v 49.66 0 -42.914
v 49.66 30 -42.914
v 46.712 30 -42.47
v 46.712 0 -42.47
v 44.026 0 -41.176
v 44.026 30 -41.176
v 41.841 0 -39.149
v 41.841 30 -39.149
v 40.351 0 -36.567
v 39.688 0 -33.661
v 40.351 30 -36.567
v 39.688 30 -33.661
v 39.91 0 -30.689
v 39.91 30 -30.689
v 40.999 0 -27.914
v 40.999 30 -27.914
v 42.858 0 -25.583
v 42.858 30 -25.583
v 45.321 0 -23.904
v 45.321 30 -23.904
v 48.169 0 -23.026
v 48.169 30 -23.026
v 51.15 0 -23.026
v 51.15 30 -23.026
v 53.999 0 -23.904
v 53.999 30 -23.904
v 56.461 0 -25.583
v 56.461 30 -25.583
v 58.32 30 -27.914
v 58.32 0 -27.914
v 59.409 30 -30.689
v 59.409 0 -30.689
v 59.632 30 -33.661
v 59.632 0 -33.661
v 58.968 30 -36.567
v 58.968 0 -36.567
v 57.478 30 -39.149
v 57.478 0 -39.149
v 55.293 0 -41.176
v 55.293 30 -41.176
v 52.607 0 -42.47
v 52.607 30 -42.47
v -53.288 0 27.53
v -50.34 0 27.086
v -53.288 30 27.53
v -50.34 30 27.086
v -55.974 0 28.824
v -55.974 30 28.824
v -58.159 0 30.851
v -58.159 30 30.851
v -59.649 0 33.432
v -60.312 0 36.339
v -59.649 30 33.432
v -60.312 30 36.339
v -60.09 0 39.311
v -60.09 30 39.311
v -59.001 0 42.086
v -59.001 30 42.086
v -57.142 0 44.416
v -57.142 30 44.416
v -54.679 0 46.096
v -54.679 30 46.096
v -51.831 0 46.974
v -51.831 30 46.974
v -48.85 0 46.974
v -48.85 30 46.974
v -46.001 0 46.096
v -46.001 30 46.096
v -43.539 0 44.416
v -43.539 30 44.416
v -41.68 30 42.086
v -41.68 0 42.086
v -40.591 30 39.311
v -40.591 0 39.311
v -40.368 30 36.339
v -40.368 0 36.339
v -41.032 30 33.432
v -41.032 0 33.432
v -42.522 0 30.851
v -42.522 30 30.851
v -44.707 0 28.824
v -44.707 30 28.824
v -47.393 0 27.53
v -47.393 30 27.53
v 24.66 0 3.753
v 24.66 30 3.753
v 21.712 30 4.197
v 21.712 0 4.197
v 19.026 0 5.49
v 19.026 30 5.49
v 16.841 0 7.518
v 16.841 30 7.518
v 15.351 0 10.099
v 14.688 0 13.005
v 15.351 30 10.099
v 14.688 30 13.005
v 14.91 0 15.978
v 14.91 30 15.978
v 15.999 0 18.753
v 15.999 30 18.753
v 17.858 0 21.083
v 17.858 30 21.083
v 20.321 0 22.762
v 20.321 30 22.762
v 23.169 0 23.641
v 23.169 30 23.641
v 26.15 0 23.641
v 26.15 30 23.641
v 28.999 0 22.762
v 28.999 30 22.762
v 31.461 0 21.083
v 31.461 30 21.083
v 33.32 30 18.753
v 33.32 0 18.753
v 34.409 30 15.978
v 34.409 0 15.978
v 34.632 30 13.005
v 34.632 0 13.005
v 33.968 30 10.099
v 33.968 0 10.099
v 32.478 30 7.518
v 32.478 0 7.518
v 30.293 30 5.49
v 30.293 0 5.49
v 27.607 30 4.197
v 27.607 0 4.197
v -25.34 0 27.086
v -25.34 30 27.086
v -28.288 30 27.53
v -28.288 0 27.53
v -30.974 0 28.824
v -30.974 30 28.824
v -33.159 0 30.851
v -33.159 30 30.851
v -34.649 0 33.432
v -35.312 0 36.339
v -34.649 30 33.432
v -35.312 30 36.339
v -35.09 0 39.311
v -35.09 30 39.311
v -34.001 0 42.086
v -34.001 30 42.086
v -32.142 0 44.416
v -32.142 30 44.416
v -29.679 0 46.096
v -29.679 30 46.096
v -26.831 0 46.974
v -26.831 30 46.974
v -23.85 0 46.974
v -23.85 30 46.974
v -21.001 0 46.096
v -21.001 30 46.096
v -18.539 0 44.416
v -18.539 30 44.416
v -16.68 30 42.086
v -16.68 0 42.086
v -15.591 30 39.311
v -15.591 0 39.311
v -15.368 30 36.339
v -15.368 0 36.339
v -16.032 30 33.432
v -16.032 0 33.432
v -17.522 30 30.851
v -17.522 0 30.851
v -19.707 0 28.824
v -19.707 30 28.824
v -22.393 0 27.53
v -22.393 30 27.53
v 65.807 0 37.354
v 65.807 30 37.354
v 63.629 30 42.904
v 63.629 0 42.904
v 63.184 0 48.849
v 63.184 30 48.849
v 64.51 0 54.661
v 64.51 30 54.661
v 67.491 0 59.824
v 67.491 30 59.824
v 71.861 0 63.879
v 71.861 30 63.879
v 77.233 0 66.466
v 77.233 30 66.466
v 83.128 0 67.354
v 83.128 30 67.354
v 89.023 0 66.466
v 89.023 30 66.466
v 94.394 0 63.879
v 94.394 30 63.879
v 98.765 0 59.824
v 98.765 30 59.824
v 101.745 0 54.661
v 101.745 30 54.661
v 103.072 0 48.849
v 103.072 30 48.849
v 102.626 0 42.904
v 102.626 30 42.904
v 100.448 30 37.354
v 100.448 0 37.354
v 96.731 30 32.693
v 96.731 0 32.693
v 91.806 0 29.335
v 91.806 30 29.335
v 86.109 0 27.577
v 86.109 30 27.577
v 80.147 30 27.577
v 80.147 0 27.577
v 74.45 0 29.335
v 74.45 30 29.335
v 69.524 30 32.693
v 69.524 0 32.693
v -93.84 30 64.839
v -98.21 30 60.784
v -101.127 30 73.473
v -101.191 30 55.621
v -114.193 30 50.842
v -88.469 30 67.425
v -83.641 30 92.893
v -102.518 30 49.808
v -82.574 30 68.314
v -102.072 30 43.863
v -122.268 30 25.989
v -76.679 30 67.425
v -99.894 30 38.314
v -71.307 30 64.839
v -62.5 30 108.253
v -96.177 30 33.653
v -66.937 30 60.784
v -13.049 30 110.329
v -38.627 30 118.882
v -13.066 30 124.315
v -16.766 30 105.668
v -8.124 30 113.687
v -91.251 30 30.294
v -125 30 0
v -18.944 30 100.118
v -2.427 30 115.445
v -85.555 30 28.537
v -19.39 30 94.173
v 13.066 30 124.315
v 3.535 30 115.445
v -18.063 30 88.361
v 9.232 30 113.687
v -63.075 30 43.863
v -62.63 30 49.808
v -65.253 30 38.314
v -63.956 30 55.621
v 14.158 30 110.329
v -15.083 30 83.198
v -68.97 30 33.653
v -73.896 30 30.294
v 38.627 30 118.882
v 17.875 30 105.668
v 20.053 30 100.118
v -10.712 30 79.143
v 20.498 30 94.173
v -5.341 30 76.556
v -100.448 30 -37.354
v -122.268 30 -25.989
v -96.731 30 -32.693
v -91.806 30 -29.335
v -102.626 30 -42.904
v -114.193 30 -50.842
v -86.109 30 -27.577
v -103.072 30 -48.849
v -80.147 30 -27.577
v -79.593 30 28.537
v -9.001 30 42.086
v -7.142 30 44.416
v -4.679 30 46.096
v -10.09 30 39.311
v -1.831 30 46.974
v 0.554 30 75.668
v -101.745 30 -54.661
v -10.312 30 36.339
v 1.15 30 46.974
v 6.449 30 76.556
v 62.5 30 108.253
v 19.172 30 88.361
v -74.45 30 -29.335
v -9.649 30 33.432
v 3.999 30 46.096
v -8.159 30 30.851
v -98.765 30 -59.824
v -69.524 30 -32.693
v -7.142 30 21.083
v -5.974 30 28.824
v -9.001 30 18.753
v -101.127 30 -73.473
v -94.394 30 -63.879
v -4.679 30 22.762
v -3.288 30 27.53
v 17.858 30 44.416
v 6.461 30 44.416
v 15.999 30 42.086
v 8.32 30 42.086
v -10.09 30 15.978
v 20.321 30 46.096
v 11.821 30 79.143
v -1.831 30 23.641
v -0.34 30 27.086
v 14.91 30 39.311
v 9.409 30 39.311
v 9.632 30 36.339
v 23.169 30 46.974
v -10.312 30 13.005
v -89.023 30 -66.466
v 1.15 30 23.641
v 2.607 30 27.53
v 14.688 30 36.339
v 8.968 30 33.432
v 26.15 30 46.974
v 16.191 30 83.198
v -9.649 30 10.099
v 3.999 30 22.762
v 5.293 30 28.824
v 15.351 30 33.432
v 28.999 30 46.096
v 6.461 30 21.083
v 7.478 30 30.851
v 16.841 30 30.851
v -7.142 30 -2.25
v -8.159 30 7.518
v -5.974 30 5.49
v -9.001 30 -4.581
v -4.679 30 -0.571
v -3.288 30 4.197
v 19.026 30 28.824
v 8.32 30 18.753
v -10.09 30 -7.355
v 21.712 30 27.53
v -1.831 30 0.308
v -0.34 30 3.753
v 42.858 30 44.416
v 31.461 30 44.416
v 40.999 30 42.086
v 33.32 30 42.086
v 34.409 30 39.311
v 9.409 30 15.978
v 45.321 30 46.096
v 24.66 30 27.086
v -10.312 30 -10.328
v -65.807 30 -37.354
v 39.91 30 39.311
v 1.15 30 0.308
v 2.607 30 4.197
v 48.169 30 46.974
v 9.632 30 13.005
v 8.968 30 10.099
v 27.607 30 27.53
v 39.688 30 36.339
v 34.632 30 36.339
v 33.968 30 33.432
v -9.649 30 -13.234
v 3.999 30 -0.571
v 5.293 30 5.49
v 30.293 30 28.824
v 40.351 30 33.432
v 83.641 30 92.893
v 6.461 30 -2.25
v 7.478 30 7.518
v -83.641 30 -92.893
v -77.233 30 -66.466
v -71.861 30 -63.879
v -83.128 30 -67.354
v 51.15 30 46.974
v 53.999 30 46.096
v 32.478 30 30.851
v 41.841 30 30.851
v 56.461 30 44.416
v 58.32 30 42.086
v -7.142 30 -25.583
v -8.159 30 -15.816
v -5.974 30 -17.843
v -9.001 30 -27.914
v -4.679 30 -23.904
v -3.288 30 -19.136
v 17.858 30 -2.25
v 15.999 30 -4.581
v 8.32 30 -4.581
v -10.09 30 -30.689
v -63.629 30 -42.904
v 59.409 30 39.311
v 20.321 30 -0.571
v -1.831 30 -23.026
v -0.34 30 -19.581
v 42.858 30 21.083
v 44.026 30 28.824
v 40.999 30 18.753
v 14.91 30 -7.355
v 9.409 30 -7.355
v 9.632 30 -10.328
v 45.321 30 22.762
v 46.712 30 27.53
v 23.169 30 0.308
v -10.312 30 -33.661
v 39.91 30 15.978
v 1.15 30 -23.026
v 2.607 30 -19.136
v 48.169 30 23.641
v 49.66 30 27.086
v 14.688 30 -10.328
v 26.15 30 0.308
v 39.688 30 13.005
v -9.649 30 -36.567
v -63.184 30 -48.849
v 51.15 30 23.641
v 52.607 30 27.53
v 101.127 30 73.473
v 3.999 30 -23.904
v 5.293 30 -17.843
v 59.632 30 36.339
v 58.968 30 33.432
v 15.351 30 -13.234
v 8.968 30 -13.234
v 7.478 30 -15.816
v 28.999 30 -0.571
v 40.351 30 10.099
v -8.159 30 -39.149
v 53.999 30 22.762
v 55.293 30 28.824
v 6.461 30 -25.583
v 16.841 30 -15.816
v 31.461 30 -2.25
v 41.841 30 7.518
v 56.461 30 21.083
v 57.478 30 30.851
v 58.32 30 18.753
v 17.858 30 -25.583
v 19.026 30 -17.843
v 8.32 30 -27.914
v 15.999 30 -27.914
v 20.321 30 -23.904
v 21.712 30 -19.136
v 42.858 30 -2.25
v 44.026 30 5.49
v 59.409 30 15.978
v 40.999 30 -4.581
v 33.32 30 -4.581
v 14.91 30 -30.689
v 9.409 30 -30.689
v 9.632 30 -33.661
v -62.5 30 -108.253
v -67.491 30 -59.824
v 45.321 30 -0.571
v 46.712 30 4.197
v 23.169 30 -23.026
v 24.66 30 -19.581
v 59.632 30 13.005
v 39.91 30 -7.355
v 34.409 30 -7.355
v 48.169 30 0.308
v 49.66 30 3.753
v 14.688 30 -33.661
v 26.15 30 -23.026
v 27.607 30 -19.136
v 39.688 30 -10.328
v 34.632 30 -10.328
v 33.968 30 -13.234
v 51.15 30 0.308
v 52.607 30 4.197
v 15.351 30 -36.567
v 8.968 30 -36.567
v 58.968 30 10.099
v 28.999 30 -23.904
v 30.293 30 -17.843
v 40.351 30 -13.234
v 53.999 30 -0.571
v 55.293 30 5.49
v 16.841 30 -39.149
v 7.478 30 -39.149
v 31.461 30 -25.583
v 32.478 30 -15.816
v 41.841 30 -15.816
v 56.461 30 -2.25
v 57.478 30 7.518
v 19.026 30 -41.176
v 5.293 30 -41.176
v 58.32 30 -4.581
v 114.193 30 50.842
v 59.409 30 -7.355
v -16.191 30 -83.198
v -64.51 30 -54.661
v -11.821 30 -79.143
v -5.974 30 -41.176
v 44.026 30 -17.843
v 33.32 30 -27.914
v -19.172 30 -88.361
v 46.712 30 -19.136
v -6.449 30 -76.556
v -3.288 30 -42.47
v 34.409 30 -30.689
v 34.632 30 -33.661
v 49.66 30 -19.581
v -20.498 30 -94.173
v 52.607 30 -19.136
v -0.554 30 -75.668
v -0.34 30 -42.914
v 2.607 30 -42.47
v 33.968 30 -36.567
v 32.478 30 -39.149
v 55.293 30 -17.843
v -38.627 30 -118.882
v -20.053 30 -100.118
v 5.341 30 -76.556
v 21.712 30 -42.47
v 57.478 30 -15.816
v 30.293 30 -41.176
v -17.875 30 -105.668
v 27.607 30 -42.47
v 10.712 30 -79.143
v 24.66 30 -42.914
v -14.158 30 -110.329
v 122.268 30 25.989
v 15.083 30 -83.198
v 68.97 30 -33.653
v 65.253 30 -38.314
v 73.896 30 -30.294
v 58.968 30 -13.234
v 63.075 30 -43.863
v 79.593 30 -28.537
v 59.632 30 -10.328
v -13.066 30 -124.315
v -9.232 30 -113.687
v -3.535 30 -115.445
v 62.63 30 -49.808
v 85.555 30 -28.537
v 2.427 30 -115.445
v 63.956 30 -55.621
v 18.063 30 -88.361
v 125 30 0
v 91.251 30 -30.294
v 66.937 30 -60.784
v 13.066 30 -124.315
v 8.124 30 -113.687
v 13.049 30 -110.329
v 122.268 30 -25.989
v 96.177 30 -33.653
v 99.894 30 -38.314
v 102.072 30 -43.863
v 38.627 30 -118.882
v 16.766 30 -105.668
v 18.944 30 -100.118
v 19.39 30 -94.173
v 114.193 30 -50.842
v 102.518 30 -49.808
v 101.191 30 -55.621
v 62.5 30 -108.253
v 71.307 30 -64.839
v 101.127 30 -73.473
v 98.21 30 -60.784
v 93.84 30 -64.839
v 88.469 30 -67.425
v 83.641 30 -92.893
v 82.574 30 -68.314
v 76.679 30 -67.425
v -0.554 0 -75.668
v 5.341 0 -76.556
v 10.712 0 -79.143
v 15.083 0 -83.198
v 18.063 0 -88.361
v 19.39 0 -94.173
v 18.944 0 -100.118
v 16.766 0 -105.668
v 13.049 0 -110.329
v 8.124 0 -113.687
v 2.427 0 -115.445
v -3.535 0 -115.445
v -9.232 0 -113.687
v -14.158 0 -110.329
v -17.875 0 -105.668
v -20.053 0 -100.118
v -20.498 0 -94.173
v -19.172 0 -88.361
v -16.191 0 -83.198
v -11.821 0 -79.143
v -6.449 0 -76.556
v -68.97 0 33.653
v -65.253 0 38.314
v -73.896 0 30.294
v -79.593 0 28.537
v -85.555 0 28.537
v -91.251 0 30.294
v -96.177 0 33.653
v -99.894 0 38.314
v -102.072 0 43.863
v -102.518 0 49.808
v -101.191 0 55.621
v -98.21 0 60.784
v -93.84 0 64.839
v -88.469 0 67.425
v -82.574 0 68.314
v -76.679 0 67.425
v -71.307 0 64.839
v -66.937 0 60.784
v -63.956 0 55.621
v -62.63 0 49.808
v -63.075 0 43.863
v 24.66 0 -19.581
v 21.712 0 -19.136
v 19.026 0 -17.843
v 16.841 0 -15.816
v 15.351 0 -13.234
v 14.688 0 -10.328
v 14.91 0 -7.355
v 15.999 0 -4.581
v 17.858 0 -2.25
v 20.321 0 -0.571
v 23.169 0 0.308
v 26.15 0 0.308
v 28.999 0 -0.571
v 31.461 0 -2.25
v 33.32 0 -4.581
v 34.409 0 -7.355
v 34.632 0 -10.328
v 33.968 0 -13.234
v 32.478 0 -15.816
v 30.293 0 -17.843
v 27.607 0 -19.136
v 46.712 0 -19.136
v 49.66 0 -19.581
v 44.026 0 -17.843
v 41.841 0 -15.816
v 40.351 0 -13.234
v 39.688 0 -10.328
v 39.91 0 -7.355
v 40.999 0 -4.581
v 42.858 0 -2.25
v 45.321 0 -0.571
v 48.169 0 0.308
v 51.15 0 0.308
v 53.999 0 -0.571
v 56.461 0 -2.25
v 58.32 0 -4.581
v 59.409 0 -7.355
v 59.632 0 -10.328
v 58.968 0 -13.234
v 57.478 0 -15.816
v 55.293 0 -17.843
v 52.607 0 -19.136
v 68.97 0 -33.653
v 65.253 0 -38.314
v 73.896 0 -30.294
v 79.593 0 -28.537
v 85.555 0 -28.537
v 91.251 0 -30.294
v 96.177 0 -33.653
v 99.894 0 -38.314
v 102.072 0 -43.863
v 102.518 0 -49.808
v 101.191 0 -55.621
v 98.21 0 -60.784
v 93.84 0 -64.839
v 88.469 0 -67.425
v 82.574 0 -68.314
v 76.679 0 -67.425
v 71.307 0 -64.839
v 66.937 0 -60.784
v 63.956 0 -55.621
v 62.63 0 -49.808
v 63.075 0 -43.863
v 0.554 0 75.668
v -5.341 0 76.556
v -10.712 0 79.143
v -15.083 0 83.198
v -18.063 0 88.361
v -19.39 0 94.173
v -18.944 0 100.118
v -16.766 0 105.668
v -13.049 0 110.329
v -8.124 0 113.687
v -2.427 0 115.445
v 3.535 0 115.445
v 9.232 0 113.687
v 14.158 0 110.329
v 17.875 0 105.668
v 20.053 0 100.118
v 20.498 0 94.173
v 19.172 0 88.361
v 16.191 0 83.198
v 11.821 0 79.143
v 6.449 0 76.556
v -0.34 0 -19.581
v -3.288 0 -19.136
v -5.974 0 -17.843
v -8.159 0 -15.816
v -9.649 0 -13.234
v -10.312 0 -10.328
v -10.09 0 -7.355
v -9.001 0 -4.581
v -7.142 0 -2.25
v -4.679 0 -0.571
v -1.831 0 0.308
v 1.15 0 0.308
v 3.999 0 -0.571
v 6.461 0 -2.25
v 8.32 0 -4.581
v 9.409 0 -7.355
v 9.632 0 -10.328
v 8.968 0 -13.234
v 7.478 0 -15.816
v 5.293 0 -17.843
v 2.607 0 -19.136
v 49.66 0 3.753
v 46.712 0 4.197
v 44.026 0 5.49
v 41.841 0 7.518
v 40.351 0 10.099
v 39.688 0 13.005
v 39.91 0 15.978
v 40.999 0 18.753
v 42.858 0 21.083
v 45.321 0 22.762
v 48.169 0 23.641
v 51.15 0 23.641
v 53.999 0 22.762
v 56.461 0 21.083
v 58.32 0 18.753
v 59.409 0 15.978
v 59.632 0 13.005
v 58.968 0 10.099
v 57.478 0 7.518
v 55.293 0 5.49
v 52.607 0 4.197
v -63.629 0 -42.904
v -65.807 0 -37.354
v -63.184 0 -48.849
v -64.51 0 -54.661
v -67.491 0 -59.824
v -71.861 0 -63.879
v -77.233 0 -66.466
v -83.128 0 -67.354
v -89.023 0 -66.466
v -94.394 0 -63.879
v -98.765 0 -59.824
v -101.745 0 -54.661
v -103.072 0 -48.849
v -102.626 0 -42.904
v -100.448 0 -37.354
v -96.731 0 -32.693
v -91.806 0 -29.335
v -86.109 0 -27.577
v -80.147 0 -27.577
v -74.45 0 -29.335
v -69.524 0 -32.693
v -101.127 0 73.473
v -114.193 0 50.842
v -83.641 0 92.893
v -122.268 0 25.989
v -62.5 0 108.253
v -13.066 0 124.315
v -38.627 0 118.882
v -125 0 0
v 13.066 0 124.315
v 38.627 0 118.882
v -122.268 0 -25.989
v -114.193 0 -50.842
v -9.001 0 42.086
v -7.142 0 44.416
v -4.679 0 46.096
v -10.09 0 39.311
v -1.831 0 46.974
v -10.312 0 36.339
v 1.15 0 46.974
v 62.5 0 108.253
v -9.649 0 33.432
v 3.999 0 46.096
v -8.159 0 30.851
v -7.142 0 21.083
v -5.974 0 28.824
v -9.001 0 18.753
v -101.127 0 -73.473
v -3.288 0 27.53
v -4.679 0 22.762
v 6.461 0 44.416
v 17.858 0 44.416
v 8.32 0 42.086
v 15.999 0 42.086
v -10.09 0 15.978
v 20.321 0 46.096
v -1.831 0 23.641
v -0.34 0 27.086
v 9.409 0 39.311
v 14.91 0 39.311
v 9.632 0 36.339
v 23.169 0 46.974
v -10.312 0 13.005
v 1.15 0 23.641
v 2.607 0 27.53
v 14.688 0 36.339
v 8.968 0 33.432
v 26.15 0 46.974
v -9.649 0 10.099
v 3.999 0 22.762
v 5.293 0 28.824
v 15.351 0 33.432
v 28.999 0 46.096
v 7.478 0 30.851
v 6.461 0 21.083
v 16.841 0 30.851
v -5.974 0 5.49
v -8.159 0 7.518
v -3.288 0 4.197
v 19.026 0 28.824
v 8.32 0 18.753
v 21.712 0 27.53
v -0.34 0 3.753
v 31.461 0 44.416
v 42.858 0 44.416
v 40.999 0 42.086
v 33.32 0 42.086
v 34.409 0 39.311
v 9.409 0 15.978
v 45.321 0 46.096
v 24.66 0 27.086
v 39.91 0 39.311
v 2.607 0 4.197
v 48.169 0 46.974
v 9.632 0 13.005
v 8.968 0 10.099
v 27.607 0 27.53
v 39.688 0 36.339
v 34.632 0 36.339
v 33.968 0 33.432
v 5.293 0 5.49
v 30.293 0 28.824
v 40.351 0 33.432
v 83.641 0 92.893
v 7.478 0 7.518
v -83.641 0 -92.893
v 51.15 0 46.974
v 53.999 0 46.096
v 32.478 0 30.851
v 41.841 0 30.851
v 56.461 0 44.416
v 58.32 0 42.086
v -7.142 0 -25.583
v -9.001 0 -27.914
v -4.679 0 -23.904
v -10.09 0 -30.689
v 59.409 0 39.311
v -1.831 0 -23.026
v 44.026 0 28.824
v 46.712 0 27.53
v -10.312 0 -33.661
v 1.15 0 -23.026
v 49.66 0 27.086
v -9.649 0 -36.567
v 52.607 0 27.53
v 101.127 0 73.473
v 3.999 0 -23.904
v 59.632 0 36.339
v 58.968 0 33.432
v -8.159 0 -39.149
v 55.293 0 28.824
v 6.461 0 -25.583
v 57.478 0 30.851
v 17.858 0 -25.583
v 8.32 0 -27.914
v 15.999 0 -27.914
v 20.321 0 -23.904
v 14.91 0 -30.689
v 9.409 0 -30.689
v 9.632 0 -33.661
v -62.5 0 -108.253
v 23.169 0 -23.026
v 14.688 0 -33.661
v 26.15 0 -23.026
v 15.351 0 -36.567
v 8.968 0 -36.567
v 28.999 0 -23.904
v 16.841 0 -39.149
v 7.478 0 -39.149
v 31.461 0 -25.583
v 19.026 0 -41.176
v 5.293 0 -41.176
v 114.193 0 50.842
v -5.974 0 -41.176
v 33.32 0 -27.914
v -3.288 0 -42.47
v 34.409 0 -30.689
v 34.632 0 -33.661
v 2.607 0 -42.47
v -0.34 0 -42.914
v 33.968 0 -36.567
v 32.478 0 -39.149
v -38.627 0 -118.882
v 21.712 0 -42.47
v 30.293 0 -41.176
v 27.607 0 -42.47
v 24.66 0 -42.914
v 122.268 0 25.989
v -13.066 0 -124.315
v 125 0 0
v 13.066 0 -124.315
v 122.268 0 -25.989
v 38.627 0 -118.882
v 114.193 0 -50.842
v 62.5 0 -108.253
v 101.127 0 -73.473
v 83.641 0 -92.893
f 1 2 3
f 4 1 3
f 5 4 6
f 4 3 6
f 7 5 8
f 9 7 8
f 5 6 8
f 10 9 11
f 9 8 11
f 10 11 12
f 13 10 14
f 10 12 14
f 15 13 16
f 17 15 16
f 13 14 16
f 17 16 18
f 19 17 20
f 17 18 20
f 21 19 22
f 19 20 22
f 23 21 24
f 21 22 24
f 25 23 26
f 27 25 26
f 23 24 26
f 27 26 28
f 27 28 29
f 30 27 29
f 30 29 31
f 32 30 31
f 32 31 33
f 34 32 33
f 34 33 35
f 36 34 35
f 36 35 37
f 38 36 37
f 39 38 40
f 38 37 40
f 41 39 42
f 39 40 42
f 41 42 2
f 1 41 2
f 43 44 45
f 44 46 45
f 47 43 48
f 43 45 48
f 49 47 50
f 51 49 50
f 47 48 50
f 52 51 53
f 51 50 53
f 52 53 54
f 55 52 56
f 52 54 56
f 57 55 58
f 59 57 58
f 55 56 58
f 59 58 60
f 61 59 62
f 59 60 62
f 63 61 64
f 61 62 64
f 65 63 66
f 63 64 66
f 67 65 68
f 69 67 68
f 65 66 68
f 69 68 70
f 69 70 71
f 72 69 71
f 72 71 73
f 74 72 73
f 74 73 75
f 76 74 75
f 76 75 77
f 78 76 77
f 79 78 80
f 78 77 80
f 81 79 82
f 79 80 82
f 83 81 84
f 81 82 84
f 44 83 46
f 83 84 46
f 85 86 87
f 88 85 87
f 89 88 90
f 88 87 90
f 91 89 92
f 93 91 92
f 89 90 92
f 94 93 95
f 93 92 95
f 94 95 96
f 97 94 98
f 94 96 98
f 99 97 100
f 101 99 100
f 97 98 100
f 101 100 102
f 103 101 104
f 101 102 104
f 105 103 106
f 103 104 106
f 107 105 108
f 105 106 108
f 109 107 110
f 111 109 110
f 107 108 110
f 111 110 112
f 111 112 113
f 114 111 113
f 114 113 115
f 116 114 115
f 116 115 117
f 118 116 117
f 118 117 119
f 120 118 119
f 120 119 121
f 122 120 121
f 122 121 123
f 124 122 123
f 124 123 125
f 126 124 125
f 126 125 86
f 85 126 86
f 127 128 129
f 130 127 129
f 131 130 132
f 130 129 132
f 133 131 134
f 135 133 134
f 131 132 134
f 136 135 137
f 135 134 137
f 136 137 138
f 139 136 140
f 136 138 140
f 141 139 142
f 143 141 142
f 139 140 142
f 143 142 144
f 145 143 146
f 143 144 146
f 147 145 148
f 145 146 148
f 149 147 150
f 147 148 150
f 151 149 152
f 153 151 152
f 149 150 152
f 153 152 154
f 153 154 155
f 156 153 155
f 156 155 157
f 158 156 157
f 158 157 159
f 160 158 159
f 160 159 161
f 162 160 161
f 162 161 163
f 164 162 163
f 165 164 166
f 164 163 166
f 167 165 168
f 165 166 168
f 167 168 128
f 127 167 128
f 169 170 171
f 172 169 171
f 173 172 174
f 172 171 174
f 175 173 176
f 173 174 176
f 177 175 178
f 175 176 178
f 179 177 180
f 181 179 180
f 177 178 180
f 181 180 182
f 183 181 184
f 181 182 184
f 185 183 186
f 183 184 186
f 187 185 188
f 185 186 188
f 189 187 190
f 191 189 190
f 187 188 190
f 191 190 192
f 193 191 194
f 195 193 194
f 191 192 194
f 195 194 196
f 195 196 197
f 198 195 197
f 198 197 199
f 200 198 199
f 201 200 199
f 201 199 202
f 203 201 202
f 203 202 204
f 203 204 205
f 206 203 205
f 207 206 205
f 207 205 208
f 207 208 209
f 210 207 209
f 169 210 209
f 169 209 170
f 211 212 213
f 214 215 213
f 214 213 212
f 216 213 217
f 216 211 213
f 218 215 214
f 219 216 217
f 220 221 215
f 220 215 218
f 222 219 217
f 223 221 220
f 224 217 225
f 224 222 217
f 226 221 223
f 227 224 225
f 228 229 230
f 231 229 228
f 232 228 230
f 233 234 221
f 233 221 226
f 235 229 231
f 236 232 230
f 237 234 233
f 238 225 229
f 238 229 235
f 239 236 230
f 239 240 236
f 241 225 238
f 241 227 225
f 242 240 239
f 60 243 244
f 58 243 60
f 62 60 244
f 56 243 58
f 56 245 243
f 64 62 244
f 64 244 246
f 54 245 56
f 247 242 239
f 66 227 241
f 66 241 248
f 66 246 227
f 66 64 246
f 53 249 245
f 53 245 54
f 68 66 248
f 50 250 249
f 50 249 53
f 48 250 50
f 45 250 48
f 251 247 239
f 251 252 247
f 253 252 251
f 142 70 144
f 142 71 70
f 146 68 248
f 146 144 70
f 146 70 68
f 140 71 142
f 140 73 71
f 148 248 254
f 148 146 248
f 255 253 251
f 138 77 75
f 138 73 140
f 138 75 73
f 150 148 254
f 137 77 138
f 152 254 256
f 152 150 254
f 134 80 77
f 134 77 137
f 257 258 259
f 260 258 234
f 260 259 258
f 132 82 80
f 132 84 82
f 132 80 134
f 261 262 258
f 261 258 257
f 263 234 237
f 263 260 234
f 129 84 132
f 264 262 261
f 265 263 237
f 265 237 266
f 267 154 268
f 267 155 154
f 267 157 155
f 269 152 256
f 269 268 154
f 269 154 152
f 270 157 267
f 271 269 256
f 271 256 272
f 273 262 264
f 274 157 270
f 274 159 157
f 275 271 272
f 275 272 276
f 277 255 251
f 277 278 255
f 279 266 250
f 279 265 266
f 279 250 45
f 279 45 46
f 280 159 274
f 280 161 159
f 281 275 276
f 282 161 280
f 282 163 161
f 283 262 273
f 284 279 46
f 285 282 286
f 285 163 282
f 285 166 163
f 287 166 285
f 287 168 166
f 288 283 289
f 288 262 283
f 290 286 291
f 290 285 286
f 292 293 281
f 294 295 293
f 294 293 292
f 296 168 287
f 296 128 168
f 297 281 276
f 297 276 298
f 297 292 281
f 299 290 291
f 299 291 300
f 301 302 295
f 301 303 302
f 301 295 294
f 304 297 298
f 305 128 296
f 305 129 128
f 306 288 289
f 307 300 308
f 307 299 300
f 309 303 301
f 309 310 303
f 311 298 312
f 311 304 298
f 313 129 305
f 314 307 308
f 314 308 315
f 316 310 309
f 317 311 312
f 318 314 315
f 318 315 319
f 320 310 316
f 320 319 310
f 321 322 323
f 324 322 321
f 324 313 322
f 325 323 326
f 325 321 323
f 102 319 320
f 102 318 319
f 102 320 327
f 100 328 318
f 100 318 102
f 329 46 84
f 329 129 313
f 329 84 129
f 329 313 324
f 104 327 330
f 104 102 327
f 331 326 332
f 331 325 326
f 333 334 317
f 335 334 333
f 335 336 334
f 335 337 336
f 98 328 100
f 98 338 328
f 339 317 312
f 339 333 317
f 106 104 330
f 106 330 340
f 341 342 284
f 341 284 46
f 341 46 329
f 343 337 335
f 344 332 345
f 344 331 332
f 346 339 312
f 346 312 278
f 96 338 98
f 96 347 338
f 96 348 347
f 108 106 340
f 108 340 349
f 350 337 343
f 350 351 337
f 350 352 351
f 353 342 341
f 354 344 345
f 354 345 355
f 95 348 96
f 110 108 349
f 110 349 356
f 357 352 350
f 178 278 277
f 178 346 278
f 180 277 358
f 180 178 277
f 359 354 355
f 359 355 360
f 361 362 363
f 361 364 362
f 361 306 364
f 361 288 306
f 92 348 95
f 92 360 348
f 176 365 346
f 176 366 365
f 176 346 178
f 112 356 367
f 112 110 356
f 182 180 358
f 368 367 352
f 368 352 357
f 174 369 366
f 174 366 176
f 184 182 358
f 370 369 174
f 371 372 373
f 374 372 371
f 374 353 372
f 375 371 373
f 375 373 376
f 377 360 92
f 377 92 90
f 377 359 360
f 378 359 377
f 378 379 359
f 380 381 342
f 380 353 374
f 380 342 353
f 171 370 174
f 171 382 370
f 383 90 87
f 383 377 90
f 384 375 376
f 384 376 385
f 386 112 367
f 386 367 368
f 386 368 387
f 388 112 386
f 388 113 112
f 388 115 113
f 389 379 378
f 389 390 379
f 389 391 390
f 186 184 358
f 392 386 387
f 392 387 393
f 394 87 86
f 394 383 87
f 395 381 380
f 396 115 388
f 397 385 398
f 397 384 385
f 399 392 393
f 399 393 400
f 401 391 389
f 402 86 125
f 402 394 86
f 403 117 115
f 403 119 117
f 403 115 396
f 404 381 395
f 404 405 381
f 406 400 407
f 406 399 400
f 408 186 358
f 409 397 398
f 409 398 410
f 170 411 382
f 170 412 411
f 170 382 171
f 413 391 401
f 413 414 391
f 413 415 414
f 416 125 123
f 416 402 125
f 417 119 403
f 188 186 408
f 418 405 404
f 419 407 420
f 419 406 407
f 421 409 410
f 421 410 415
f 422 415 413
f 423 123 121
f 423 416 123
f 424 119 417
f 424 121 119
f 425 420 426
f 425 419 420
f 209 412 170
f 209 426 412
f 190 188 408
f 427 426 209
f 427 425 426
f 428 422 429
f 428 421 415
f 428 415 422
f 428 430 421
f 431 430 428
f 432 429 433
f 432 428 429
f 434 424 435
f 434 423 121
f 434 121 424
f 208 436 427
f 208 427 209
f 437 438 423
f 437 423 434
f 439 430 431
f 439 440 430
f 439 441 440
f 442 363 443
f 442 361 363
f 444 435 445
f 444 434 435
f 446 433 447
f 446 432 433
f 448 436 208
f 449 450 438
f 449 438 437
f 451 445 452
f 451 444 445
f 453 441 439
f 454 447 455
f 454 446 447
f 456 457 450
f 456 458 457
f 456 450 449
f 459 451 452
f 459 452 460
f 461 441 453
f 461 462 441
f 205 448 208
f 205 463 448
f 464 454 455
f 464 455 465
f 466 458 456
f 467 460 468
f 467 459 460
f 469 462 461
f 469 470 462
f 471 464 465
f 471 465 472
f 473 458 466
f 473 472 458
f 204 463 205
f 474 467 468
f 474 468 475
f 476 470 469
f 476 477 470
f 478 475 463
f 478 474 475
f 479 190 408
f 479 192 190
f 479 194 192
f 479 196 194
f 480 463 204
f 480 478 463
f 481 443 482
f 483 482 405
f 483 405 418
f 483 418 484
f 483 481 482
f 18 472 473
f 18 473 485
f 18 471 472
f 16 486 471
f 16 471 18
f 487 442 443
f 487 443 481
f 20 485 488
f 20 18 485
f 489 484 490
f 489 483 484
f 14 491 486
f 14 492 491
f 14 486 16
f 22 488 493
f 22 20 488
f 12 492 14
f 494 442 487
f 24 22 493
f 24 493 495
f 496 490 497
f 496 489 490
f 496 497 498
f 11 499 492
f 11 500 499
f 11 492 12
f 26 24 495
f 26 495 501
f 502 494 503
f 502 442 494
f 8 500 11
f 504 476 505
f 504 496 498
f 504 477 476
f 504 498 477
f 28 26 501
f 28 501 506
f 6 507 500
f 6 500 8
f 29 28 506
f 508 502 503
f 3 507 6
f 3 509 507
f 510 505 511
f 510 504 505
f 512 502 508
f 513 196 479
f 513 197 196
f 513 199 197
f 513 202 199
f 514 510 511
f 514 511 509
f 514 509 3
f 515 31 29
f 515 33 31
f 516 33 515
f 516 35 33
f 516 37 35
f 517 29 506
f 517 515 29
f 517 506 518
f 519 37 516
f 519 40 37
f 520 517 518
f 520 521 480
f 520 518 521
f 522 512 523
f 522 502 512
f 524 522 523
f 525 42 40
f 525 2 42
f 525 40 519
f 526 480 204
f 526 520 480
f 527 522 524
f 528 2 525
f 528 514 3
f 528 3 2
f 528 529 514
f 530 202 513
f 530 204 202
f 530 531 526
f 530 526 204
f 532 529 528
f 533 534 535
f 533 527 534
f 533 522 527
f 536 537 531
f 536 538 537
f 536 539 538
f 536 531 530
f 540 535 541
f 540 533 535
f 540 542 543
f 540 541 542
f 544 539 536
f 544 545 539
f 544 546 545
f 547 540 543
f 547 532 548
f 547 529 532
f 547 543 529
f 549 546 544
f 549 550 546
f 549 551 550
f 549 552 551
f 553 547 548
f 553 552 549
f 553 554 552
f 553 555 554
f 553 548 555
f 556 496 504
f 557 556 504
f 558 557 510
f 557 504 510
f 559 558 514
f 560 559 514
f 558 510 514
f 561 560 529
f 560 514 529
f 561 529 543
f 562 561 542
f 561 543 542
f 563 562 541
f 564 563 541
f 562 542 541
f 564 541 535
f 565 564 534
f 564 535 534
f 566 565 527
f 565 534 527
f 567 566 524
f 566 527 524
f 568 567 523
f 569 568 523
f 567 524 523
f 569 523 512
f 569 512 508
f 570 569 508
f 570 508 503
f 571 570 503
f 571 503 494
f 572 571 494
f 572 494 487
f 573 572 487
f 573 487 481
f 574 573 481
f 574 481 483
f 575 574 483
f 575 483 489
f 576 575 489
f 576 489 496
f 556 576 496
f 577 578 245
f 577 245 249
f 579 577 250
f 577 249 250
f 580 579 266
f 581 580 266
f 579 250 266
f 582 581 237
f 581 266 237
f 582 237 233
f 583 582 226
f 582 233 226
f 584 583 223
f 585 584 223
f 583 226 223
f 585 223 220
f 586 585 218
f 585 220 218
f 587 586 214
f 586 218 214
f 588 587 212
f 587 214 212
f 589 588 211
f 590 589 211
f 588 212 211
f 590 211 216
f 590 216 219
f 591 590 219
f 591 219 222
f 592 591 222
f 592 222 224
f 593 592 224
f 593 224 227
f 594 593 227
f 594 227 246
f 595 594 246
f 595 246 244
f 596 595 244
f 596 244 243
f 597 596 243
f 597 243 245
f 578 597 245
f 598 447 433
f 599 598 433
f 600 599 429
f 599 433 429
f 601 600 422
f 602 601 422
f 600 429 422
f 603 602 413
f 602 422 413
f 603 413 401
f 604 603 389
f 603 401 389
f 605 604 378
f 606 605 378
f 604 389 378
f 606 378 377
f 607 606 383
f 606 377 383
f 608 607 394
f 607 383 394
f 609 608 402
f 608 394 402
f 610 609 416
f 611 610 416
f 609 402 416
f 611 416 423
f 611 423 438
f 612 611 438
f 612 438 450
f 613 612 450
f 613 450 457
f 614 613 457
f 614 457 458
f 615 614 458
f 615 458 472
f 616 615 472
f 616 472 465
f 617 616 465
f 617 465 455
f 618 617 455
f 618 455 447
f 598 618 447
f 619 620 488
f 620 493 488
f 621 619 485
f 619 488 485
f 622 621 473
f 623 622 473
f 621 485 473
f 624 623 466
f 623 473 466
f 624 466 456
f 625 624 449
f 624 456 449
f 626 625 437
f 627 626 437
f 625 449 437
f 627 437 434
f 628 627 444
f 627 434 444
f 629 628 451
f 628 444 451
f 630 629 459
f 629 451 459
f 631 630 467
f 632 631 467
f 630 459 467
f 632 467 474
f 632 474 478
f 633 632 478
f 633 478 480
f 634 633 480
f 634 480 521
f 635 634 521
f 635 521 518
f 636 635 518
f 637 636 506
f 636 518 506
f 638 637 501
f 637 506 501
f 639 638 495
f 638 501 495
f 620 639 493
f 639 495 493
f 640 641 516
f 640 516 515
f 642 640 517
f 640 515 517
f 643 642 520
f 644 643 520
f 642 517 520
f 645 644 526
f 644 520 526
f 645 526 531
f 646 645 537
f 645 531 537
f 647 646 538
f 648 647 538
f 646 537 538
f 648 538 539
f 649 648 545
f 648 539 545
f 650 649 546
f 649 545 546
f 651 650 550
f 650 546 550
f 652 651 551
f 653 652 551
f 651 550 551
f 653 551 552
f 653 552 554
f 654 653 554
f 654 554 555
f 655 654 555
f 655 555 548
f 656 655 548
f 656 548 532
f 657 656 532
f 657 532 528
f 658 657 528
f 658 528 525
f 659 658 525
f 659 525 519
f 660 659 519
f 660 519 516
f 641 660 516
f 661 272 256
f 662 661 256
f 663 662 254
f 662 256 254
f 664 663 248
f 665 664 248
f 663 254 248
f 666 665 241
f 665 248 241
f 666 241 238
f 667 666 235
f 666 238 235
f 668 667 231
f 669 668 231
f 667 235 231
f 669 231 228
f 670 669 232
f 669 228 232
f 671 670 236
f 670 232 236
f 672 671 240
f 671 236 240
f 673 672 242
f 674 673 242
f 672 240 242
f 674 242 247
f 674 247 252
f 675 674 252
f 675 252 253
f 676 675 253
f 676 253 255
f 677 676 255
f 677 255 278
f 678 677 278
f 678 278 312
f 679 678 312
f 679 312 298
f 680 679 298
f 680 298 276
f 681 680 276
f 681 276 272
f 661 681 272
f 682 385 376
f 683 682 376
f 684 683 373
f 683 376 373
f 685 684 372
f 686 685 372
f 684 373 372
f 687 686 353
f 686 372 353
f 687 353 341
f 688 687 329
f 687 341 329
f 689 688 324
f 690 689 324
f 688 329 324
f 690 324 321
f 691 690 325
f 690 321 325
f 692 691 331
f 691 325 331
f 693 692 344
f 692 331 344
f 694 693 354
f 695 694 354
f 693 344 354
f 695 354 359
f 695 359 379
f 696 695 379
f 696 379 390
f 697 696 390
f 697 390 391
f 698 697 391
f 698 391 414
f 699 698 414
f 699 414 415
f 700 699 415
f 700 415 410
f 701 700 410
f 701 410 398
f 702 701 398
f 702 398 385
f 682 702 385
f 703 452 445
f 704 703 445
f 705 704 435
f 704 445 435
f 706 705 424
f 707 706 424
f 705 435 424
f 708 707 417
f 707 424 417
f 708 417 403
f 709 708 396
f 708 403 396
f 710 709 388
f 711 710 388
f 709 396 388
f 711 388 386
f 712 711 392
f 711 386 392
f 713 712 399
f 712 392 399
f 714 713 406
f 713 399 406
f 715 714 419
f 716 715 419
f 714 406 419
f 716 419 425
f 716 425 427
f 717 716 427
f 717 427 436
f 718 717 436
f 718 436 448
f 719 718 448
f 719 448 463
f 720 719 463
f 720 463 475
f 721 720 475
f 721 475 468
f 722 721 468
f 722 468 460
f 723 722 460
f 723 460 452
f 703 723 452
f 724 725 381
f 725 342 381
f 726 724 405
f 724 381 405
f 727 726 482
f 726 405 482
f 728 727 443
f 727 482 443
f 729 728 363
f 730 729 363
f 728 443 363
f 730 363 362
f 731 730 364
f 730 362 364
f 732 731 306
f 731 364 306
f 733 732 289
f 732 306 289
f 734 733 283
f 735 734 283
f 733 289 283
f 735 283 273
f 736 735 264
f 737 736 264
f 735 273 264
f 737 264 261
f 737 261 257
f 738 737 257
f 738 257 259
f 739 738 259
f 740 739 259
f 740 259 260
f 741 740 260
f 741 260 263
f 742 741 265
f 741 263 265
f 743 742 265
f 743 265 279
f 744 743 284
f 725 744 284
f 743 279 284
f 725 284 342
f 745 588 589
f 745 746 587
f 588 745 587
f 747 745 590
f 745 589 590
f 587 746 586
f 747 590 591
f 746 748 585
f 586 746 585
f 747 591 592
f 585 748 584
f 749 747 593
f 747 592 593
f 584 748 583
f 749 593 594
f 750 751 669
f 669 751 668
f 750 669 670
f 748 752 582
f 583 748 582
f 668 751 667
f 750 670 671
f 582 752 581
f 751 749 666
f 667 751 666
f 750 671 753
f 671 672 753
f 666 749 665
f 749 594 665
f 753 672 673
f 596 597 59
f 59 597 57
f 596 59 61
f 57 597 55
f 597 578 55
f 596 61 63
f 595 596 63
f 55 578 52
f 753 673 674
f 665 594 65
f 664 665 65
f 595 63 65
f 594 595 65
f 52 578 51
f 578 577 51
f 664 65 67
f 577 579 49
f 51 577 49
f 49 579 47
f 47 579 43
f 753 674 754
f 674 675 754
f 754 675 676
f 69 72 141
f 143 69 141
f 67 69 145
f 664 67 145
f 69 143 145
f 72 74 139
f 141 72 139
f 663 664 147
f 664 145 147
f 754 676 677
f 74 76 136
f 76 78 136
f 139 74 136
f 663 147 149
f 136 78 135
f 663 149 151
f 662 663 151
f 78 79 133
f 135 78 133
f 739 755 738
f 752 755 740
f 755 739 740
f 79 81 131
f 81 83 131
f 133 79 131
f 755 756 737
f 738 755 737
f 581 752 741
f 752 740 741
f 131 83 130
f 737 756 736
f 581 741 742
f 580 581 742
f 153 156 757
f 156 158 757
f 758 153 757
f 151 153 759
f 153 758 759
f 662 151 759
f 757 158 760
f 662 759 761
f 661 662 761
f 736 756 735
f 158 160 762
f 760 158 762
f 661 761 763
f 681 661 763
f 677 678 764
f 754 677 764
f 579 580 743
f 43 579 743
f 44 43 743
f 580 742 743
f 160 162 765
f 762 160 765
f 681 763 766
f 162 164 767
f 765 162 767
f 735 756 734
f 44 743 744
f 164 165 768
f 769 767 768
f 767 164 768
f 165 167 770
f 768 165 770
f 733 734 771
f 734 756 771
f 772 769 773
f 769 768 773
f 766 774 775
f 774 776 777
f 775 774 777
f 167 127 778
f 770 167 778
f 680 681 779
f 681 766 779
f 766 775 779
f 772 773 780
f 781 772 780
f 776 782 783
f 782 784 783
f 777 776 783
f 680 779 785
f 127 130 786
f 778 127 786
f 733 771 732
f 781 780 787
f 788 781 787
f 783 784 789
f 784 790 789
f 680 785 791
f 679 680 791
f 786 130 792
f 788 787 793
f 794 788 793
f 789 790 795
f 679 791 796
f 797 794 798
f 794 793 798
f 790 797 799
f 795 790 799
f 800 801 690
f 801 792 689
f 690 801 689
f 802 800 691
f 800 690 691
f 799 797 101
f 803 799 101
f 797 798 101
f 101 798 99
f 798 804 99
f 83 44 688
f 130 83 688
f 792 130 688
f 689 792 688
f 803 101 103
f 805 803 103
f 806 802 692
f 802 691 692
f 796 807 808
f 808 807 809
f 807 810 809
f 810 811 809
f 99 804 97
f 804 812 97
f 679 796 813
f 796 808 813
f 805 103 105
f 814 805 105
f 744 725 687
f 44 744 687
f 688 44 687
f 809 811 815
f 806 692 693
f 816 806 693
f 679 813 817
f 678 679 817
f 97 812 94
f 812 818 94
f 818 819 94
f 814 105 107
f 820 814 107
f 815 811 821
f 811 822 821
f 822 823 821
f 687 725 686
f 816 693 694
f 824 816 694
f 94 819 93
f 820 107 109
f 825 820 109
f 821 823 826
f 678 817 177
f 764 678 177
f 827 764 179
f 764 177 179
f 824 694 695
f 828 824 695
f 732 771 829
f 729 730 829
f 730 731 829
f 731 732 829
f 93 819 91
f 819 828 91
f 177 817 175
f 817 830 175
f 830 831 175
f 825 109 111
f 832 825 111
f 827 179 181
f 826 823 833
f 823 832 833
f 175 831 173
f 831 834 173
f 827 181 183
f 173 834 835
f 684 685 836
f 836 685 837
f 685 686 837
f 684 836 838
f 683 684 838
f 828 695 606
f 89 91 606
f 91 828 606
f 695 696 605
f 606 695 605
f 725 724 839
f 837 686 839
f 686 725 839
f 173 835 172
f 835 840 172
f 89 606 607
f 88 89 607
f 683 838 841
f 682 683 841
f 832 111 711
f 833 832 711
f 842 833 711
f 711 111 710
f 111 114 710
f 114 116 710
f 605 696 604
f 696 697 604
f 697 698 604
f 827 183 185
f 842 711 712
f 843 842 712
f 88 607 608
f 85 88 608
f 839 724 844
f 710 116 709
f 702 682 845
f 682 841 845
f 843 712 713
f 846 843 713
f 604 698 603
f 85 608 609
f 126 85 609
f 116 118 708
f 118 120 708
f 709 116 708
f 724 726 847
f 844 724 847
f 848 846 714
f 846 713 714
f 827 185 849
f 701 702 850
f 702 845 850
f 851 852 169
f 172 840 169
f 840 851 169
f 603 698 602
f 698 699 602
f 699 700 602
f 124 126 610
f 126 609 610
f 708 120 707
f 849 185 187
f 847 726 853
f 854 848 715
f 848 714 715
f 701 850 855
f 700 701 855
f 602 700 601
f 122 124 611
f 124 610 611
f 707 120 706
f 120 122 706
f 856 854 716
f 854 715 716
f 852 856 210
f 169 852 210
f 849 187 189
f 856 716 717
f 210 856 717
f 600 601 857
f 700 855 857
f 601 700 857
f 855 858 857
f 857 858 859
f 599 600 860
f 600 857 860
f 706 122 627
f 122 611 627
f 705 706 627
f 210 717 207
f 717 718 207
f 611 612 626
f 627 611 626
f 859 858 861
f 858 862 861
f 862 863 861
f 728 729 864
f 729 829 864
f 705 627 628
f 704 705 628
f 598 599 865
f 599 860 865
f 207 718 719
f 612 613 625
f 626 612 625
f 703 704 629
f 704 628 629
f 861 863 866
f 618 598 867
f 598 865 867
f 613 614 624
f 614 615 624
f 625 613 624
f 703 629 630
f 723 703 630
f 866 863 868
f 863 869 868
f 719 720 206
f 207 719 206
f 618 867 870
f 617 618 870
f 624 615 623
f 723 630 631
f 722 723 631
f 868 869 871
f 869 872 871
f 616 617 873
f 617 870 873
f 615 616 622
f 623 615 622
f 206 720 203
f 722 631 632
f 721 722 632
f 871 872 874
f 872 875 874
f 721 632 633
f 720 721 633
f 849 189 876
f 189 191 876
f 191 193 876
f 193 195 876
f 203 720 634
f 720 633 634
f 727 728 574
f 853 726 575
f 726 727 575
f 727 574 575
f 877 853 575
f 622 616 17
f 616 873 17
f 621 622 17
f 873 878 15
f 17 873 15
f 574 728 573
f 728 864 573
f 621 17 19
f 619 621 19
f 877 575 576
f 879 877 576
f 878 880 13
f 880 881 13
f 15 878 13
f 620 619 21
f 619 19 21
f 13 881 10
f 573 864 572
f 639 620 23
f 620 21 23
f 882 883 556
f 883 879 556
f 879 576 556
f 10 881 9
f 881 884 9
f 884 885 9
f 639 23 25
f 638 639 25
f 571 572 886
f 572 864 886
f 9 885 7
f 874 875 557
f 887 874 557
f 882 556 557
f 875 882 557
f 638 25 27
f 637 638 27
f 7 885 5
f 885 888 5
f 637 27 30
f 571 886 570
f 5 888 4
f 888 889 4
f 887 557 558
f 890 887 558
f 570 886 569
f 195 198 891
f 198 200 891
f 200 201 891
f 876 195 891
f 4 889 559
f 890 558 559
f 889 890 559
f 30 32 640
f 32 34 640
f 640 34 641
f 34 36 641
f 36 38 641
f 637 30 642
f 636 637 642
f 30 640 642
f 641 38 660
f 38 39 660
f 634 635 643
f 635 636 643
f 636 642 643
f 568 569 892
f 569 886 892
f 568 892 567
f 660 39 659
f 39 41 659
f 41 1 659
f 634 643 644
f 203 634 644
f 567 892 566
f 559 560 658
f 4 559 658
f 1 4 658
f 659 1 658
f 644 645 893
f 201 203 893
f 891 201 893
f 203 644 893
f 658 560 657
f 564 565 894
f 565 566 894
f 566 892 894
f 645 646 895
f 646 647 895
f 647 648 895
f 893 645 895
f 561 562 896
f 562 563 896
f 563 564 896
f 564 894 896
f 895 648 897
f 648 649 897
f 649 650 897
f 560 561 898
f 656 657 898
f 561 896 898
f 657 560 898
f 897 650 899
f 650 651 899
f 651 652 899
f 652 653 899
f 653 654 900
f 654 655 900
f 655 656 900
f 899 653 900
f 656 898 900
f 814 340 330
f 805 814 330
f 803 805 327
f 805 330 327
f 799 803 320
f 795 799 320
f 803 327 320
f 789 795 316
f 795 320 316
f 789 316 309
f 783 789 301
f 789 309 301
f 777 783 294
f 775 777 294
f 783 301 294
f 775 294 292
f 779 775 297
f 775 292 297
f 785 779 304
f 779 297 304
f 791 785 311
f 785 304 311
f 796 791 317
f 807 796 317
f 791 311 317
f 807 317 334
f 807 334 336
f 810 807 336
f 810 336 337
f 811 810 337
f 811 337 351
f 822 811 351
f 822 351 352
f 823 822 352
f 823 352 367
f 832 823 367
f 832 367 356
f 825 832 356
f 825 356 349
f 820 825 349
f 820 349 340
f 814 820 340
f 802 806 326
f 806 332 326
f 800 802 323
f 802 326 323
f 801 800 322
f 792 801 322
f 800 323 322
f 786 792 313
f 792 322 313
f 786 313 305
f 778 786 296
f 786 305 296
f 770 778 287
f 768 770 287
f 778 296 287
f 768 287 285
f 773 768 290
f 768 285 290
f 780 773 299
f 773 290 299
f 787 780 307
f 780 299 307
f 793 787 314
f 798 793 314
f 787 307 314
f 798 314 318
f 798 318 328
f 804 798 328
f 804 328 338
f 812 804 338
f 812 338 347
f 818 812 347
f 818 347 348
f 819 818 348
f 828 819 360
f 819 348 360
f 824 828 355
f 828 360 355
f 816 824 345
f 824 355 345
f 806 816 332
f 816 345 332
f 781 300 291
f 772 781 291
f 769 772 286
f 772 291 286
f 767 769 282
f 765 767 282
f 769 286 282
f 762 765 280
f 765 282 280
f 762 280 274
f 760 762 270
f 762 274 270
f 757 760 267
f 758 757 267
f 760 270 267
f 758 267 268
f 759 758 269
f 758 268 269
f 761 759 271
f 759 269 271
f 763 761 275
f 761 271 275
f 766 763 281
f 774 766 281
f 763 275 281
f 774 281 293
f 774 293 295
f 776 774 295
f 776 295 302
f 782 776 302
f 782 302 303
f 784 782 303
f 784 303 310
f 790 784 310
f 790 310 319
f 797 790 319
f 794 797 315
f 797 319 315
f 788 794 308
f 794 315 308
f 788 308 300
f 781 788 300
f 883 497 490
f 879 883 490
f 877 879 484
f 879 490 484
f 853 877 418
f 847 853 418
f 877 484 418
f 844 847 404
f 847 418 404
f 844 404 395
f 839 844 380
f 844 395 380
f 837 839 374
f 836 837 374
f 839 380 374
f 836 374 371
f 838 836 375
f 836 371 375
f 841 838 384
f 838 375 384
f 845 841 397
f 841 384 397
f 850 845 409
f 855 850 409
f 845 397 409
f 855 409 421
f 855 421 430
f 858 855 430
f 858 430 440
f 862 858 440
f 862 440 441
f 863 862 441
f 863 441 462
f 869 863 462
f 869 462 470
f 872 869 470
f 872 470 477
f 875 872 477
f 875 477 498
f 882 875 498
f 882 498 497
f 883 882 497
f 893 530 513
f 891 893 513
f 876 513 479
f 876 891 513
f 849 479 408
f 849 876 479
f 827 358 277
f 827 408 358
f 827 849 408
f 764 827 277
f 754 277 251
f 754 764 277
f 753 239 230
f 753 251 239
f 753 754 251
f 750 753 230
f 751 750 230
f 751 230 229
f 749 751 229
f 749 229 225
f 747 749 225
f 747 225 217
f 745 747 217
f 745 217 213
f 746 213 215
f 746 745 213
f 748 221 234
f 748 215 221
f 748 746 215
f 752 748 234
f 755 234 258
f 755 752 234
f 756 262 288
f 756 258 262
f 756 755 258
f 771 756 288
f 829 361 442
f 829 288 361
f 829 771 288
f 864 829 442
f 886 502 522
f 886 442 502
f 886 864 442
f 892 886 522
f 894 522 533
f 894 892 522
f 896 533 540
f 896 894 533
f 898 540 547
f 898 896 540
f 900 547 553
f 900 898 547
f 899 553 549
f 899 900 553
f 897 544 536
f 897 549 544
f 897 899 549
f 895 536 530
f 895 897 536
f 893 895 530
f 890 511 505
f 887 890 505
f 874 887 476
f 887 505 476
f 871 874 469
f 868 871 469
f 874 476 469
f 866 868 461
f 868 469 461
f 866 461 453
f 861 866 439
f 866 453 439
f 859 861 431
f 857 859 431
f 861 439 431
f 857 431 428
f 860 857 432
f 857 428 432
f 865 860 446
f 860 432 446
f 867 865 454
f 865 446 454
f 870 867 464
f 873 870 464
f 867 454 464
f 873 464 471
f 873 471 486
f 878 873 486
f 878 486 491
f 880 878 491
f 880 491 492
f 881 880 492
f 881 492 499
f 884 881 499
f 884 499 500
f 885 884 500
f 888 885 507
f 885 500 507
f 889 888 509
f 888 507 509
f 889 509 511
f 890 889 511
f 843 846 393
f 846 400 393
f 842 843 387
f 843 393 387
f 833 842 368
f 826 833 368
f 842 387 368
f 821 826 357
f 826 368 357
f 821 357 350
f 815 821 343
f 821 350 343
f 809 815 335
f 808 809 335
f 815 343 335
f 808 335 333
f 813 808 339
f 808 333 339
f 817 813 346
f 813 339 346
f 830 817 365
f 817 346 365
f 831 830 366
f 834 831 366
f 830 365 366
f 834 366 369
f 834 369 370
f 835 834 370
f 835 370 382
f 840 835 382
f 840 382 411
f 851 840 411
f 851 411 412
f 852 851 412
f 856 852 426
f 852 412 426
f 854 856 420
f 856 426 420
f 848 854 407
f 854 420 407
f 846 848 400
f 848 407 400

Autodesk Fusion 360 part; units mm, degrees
sketch "Sketch1" plane through (0, 0, 0) normal (0, 1, 0) x (1, 0, 0)
  circle A0 centre (0, 0) radius 125
extrude "Extrude1" add sketch "Sketch1" along normal blind 30
hole "Hole1" at (0.5541, 0, 95.6679) direction (0, 1, 0) diameter 40 depth 70 tip angle 118
pattern_circular "C-Pattern1" count 6 over 360 about axis through (0, 1.75, 0) along (0, 1, 0) of "Hole1"
hole "Hole2" at (-0.3403, 0, 37.0859) direction (0, 1, 0) diameter 20 depth 70 tip angle 118
pattern_linear "R-Pattern1" count 3 spacing 25 along (1, 0, 0) count 4 spacing 23.3333 along (0, 0, -1) of "Hole2"
pattern_linear "R-Pattern2" count 3 spacing 25 along (-1, 0, 0) of "Hole2"
